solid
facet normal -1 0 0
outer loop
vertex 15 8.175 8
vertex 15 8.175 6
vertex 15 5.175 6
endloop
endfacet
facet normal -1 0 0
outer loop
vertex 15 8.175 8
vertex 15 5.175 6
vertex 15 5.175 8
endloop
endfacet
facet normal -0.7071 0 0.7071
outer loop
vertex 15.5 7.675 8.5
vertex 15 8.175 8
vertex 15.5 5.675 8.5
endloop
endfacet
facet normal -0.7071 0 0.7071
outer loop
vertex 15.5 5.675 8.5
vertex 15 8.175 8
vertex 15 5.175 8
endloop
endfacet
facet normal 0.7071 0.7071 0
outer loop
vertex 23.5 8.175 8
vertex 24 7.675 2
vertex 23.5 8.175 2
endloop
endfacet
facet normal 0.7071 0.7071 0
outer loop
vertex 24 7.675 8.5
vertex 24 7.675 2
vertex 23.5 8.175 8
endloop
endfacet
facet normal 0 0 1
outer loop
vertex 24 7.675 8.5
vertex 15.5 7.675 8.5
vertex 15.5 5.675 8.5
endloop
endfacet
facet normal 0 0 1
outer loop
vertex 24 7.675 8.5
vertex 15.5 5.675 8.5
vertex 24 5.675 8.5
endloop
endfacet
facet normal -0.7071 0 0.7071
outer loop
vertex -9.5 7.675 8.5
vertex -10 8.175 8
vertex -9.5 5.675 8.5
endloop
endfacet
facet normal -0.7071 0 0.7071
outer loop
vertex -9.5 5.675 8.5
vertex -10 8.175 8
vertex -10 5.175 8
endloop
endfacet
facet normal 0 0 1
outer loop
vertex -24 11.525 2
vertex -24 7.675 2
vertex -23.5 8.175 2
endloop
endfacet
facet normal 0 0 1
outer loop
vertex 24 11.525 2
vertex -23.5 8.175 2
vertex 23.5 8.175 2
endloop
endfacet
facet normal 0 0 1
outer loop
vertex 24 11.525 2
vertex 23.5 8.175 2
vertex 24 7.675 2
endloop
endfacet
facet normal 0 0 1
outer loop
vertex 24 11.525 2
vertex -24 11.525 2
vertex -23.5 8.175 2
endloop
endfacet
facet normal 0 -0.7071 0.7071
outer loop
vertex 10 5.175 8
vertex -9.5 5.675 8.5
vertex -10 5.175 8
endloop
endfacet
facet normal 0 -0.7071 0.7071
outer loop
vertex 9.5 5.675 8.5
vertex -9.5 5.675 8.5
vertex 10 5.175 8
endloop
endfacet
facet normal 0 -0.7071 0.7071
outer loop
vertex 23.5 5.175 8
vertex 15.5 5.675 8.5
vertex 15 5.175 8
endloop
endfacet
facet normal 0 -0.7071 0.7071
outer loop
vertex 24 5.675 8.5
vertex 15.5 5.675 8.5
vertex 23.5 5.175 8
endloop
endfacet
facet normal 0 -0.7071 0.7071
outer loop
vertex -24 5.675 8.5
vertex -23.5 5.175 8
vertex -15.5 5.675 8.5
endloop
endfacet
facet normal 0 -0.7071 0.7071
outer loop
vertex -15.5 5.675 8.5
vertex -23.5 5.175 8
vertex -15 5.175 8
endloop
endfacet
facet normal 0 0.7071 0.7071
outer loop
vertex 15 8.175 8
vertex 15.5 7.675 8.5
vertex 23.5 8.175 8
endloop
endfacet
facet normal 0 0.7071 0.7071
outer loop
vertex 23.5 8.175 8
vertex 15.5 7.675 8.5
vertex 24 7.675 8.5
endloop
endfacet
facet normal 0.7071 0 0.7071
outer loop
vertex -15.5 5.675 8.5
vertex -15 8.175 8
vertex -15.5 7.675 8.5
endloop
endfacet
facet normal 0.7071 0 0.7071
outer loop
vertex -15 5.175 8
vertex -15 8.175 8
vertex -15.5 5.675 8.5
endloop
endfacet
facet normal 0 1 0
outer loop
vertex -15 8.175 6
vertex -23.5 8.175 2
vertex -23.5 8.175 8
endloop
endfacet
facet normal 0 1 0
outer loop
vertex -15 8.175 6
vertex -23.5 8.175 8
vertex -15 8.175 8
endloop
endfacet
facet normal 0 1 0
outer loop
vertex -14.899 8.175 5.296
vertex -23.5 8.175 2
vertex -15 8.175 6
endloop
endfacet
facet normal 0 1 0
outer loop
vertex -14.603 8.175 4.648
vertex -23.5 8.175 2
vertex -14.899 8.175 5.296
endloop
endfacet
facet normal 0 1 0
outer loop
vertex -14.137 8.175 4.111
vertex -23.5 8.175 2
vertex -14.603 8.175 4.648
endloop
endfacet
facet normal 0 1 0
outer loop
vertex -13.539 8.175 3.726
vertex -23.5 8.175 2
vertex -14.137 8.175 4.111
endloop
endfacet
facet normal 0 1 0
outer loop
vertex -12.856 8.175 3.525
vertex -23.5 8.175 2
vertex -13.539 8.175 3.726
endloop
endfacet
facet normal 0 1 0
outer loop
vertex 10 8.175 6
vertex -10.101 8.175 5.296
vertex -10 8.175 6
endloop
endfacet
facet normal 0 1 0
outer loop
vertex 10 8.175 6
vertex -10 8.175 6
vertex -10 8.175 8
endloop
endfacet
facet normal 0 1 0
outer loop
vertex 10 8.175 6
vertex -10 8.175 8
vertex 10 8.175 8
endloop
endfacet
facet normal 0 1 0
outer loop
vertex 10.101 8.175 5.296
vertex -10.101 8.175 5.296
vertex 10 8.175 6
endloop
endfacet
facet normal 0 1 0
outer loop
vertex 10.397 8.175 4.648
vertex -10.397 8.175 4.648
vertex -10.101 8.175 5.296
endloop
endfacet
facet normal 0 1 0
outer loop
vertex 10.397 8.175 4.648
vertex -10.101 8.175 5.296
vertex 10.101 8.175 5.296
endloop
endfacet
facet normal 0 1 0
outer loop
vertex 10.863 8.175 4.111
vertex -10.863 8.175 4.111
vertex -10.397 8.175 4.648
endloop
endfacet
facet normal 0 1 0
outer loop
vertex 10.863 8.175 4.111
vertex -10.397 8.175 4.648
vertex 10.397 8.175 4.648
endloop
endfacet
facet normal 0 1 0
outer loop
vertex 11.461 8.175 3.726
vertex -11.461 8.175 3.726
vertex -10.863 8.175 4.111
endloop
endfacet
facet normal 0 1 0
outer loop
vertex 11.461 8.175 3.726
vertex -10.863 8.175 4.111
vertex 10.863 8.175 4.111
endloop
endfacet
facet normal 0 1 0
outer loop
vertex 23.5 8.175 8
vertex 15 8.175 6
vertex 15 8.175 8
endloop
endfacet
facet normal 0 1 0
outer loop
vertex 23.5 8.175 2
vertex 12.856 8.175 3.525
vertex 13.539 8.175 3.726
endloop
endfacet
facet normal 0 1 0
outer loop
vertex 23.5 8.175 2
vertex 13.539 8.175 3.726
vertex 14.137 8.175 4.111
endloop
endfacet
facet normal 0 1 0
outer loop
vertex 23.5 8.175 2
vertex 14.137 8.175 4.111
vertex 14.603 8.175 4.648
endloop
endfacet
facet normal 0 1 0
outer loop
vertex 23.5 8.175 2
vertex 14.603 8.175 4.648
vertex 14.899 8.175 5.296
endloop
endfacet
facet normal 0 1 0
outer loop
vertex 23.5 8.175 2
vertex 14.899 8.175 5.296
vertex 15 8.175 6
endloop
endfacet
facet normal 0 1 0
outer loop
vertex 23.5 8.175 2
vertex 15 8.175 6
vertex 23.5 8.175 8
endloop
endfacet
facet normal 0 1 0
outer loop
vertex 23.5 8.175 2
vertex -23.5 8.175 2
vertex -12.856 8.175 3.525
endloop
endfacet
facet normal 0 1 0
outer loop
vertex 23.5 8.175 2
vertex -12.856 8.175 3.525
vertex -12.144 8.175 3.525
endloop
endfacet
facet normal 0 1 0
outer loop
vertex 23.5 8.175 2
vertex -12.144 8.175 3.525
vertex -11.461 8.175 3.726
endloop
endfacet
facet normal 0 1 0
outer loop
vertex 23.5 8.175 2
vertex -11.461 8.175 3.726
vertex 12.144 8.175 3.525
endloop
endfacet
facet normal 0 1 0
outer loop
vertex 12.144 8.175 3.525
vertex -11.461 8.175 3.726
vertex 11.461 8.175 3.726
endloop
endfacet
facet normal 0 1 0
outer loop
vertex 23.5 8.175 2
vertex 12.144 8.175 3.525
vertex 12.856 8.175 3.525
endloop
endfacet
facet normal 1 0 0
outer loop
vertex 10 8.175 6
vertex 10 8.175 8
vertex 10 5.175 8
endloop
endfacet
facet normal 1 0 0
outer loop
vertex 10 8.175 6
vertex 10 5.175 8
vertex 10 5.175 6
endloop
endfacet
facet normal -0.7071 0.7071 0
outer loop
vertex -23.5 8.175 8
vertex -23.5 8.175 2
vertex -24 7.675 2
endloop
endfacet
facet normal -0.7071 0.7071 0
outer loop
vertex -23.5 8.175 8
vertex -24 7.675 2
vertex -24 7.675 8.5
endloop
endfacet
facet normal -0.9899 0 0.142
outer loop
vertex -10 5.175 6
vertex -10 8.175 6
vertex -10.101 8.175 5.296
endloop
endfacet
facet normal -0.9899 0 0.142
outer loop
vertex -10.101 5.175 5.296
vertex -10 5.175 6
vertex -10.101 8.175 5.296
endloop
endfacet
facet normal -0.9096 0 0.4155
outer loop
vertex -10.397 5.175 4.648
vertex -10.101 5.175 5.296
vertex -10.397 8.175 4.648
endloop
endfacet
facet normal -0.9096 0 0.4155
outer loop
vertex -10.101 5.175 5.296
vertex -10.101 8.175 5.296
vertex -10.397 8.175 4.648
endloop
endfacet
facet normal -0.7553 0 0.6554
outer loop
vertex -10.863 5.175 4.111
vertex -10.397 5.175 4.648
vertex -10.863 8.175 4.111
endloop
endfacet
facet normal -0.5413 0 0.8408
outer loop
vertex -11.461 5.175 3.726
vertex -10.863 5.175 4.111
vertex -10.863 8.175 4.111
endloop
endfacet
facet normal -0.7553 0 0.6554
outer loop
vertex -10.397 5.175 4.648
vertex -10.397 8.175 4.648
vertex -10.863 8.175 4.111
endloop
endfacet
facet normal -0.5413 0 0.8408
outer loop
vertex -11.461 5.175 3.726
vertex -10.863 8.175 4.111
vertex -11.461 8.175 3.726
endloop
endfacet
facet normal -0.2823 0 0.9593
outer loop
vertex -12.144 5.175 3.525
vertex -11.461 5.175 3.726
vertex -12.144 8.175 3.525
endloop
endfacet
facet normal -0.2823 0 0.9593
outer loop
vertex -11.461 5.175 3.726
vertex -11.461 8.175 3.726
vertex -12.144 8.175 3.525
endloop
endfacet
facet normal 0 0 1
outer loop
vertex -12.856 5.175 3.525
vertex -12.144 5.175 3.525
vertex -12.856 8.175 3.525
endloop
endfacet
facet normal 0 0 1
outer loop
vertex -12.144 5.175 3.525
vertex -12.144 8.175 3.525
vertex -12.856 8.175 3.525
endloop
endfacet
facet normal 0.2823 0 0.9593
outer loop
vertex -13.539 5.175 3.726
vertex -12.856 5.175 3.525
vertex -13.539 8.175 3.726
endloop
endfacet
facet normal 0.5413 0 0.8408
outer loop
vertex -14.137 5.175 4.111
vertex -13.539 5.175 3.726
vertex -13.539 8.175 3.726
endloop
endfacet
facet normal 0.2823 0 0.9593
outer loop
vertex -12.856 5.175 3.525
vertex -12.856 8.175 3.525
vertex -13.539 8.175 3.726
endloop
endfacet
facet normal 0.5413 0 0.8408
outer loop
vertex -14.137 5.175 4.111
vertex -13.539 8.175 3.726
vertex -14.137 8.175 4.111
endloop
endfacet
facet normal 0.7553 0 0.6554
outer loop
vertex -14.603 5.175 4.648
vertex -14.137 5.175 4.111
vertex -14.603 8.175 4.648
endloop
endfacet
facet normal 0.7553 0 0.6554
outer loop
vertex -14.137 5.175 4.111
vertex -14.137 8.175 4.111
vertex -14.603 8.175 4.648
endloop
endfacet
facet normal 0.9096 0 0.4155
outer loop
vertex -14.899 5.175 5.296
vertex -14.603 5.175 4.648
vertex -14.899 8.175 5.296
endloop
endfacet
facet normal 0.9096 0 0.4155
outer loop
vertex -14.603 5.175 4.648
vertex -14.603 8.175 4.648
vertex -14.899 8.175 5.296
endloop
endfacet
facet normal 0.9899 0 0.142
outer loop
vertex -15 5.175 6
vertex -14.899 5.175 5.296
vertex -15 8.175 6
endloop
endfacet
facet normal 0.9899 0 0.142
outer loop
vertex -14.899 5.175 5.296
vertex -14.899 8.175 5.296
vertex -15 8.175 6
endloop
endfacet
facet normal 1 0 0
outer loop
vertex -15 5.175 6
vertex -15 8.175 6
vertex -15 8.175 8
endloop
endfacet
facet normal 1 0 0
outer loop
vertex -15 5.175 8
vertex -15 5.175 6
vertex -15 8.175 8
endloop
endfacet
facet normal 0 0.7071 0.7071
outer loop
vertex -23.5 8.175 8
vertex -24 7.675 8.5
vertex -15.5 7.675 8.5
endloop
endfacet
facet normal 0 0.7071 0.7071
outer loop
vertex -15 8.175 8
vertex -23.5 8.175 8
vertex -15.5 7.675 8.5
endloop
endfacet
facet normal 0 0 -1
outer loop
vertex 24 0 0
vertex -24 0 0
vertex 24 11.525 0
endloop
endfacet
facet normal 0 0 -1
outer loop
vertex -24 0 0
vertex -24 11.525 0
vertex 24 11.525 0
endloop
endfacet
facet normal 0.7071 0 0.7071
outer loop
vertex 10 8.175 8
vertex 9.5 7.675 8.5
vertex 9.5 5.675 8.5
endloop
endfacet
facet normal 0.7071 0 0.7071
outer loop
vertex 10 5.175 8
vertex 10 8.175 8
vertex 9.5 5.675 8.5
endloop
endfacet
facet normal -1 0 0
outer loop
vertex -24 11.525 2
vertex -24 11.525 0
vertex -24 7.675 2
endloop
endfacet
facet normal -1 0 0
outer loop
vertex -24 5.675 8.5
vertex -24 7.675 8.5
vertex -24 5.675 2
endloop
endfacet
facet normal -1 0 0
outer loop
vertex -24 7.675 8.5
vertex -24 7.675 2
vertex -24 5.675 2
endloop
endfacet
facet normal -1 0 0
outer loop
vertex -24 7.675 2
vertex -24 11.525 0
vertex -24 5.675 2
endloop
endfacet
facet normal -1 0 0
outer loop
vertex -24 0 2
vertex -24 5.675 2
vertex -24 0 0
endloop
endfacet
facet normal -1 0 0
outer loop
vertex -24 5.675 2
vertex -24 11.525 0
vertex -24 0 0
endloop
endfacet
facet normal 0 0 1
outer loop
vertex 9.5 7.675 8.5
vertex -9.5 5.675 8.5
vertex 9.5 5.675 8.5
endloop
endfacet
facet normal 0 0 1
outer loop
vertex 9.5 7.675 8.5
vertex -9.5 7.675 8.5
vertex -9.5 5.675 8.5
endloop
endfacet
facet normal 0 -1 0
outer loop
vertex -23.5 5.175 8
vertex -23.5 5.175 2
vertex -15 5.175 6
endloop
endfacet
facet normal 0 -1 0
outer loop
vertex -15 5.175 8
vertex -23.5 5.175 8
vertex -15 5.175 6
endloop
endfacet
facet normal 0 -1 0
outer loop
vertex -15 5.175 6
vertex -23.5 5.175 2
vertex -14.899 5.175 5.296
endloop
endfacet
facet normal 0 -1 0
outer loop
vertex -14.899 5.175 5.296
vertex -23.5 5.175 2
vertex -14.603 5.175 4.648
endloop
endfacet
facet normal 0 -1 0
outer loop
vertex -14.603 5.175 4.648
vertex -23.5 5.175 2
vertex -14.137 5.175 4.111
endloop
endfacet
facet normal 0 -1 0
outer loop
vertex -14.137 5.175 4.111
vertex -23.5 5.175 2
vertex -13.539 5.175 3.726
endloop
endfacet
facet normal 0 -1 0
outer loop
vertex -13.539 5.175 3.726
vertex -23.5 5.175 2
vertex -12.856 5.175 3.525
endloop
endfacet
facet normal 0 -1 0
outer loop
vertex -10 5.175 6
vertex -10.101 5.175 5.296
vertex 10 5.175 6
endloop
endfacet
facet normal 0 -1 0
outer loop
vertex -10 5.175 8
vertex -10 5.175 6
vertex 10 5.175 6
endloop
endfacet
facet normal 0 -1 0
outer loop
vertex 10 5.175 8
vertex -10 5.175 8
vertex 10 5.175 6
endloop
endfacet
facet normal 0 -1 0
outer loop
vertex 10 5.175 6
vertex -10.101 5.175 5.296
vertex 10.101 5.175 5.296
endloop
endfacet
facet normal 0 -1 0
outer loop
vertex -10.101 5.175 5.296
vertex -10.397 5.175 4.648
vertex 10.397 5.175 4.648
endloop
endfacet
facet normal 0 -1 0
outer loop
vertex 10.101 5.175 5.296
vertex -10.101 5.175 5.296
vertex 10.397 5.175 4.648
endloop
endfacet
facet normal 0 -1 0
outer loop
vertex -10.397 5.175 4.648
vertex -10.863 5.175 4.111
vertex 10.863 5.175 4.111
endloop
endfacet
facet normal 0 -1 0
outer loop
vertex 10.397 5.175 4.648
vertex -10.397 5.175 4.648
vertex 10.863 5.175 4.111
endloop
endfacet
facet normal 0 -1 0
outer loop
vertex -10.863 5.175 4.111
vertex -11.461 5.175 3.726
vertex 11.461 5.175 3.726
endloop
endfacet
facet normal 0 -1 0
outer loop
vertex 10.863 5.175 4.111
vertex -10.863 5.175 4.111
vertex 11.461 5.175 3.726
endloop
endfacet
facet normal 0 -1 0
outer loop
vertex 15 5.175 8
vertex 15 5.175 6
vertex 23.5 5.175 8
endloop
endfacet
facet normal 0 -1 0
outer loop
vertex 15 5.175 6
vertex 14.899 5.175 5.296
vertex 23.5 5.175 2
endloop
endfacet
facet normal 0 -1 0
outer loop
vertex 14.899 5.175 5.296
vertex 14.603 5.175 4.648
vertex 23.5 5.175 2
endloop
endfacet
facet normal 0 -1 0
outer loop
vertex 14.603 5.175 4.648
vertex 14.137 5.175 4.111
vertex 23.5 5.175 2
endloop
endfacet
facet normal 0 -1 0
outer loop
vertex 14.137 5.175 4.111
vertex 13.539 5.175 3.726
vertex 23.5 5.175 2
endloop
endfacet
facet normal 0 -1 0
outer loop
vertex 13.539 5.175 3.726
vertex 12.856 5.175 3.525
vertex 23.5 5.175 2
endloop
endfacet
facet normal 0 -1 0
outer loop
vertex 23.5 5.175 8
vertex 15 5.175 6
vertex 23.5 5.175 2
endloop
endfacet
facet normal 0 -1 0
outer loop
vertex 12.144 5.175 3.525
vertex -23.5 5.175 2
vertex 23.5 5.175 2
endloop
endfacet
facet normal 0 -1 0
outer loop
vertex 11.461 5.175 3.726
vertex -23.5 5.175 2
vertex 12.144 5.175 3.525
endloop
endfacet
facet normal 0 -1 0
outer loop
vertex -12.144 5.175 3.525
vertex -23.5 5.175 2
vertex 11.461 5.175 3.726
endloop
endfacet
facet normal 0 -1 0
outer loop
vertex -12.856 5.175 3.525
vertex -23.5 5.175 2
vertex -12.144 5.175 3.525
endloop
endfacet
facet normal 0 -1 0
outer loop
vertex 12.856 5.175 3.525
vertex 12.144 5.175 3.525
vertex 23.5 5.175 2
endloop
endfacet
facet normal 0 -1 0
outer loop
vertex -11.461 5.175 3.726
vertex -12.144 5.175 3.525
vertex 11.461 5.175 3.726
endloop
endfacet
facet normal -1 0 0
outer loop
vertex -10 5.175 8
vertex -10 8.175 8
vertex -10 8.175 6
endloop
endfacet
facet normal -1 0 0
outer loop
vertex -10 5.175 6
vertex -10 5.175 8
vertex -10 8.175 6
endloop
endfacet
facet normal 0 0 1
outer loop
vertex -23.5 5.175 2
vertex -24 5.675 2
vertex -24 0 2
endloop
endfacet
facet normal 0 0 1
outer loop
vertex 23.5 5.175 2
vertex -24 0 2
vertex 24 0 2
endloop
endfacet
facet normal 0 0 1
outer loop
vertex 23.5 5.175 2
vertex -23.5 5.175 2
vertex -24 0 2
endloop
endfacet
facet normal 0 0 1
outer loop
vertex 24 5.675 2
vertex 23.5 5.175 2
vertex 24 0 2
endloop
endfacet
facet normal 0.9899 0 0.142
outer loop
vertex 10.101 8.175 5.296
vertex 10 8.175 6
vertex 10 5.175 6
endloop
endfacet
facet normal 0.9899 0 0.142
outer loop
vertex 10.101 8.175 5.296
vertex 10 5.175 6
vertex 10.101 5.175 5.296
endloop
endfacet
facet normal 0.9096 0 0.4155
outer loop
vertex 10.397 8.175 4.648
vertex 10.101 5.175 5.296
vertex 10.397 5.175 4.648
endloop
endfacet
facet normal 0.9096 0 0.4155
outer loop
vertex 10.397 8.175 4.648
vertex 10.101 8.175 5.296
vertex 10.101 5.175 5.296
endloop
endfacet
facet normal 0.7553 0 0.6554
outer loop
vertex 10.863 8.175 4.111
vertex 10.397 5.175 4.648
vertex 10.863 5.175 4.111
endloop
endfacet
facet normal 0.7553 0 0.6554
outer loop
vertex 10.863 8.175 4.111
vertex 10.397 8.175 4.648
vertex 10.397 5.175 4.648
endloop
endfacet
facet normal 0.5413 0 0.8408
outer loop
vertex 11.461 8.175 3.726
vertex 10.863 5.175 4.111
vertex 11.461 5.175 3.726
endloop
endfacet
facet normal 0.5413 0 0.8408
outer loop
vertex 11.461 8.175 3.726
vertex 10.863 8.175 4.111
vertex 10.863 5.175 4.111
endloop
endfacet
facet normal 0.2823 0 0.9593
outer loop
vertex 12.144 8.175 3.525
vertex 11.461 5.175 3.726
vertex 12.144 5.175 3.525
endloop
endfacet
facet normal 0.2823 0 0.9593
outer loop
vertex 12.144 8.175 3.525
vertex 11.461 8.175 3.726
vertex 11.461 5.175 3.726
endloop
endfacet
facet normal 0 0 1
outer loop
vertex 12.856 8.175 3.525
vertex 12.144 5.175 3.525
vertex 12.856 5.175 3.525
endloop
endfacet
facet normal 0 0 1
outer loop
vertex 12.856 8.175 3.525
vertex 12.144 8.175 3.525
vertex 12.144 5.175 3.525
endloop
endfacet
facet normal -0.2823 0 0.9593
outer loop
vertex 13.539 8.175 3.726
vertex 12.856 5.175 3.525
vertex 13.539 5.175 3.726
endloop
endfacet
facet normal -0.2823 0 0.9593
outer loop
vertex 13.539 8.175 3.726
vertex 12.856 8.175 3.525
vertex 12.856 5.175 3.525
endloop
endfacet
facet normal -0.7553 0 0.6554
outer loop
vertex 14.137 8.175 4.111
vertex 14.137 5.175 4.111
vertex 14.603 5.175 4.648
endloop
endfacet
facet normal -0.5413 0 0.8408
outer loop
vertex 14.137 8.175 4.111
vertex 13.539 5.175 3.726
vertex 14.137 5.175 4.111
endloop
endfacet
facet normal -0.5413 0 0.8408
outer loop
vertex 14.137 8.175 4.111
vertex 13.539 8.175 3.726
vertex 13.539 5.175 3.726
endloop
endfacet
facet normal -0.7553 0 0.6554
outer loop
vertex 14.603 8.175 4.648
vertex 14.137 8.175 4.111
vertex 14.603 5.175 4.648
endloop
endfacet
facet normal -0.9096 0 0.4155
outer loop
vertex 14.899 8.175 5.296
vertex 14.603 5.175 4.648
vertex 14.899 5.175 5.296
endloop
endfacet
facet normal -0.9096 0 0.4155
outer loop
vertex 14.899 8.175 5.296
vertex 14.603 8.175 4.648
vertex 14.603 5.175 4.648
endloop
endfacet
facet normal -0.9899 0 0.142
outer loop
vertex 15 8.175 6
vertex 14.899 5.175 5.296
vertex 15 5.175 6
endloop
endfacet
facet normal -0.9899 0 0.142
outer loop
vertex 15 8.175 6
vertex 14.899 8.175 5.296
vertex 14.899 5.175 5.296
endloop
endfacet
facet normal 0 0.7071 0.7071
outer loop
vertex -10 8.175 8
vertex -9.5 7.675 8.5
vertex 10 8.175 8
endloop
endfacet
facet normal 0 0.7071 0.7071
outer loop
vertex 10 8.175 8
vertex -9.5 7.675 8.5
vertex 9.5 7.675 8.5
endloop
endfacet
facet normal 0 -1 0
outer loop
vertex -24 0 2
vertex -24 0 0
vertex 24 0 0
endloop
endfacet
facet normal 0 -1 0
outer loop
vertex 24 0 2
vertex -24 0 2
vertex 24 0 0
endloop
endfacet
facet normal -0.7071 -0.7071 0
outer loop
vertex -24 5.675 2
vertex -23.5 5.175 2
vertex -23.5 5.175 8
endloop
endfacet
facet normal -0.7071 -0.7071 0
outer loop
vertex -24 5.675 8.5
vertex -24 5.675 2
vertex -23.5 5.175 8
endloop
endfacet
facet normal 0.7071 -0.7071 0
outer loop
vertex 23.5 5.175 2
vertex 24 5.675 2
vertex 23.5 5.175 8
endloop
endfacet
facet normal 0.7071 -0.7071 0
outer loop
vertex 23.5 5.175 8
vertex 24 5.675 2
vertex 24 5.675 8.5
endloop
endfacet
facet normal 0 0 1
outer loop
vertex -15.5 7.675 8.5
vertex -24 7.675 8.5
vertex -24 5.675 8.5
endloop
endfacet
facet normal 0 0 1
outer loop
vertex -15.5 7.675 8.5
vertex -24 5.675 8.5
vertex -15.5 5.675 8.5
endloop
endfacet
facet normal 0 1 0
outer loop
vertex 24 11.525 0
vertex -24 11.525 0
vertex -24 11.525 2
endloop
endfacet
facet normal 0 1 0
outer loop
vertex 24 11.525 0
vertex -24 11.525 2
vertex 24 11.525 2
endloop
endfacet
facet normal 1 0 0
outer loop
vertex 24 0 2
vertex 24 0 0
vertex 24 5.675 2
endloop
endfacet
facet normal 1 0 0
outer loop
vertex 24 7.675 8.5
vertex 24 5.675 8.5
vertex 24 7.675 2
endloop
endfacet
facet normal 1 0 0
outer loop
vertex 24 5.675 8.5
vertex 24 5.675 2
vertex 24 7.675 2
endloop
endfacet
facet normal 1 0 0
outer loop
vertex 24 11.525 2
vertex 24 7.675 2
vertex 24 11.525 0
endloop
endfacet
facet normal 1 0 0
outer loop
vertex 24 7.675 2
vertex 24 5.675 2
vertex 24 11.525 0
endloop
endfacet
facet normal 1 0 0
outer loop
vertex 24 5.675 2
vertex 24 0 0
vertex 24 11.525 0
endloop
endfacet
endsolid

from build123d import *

# Parameters (mm, degrees)
SKETCH1_W           = 48
SKETCH1_H           = 11.525
BOSS_EXTRUDE1_DEPTH = 2
SKETCH1_3_W         = 48
SKETCH1_3_H         = 3
BOSS_EXTRUDE2_DEPTH = 8.5
CUT_EXTRUDE1_DEPTH  = 27.740991474
CHAMFER1_SIZE       = 0.5


with BuildPart() as part:
    # Sketch1 → Boss-Extrude1 (new body)
    with BuildSketch(Plane.XY):
        with Locations((0, 5.7625)):
            Rectangle(SKETCH1_W, SKETCH1_H)
    extrude(amount=BOSS_EXTRUDE1_DEPTH)

    # Sketch1<3> → Boss-Extrude2 (add)
    with BuildSketch(Plane.XY):
        with Locations((0, 6.675)):
            Rectangle(SKETCH1_3_W, SKETCH1_3_H)
    extrude(amount=BOSS_EXTRUDE2_DEPTH)

    # Sketch2 → Cut-Extrude1 (cut, through all)
    with BuildSketch(Plane(origin=(0, 8.175, 0), x_dir=(1, 0, 0), z_dir=(0, 1, 0))):
        with BuildLine():
            Line((-15, -6), (-15, -8.5))
            Line((-15, -8.5), (-10, -8.5))
            Line((-10, -8.5), (-10, -6))
            ThreePointArc((-10, -6), (-12.5, -3.5), (-15, -6))
        make_face()
        with BuildLine():
            Line((10, -8.5), (10, -6))
            ThreePointArc((10, -6), (12.5, -3.5), (15, -6))
            Line((15, -6), (15, -8.5))
            Line((15, -8.5), (10, -8.5))
        make_face()
    extrude(amount=-CUT_EXTRUDE1_DEPTH, mode=Mode.SUBTRACT)

    # Chamfer1
    chamfer1_edges = [part.edges().sort_by_distance(p)[0] for p in [
        (-24, 5.175, 5.25),
        (-19.5, 5.175, 8.5),
        (-15, 6.675, 8.5),
        (-24, 8.175, 5.25),
        (-19.5, 8.175, 8.5),
        (10, 6.675, 8.5),
        (0, 5.175, 8.5),
        (-10, 6.675, 8.5),
        (0, 8.175, 8.5),
        (24, 5.175, 5.25),
        (19.5, 5.175, 8.5),
        (15, 6.675, 8.5),
        (19.5, 8.175, 8.5),
        (24, 8.175, 5.25),
    ]]
    chamfer(chamfer1_edges, length=CHAMFER1_SIZE)


solid = part.part
